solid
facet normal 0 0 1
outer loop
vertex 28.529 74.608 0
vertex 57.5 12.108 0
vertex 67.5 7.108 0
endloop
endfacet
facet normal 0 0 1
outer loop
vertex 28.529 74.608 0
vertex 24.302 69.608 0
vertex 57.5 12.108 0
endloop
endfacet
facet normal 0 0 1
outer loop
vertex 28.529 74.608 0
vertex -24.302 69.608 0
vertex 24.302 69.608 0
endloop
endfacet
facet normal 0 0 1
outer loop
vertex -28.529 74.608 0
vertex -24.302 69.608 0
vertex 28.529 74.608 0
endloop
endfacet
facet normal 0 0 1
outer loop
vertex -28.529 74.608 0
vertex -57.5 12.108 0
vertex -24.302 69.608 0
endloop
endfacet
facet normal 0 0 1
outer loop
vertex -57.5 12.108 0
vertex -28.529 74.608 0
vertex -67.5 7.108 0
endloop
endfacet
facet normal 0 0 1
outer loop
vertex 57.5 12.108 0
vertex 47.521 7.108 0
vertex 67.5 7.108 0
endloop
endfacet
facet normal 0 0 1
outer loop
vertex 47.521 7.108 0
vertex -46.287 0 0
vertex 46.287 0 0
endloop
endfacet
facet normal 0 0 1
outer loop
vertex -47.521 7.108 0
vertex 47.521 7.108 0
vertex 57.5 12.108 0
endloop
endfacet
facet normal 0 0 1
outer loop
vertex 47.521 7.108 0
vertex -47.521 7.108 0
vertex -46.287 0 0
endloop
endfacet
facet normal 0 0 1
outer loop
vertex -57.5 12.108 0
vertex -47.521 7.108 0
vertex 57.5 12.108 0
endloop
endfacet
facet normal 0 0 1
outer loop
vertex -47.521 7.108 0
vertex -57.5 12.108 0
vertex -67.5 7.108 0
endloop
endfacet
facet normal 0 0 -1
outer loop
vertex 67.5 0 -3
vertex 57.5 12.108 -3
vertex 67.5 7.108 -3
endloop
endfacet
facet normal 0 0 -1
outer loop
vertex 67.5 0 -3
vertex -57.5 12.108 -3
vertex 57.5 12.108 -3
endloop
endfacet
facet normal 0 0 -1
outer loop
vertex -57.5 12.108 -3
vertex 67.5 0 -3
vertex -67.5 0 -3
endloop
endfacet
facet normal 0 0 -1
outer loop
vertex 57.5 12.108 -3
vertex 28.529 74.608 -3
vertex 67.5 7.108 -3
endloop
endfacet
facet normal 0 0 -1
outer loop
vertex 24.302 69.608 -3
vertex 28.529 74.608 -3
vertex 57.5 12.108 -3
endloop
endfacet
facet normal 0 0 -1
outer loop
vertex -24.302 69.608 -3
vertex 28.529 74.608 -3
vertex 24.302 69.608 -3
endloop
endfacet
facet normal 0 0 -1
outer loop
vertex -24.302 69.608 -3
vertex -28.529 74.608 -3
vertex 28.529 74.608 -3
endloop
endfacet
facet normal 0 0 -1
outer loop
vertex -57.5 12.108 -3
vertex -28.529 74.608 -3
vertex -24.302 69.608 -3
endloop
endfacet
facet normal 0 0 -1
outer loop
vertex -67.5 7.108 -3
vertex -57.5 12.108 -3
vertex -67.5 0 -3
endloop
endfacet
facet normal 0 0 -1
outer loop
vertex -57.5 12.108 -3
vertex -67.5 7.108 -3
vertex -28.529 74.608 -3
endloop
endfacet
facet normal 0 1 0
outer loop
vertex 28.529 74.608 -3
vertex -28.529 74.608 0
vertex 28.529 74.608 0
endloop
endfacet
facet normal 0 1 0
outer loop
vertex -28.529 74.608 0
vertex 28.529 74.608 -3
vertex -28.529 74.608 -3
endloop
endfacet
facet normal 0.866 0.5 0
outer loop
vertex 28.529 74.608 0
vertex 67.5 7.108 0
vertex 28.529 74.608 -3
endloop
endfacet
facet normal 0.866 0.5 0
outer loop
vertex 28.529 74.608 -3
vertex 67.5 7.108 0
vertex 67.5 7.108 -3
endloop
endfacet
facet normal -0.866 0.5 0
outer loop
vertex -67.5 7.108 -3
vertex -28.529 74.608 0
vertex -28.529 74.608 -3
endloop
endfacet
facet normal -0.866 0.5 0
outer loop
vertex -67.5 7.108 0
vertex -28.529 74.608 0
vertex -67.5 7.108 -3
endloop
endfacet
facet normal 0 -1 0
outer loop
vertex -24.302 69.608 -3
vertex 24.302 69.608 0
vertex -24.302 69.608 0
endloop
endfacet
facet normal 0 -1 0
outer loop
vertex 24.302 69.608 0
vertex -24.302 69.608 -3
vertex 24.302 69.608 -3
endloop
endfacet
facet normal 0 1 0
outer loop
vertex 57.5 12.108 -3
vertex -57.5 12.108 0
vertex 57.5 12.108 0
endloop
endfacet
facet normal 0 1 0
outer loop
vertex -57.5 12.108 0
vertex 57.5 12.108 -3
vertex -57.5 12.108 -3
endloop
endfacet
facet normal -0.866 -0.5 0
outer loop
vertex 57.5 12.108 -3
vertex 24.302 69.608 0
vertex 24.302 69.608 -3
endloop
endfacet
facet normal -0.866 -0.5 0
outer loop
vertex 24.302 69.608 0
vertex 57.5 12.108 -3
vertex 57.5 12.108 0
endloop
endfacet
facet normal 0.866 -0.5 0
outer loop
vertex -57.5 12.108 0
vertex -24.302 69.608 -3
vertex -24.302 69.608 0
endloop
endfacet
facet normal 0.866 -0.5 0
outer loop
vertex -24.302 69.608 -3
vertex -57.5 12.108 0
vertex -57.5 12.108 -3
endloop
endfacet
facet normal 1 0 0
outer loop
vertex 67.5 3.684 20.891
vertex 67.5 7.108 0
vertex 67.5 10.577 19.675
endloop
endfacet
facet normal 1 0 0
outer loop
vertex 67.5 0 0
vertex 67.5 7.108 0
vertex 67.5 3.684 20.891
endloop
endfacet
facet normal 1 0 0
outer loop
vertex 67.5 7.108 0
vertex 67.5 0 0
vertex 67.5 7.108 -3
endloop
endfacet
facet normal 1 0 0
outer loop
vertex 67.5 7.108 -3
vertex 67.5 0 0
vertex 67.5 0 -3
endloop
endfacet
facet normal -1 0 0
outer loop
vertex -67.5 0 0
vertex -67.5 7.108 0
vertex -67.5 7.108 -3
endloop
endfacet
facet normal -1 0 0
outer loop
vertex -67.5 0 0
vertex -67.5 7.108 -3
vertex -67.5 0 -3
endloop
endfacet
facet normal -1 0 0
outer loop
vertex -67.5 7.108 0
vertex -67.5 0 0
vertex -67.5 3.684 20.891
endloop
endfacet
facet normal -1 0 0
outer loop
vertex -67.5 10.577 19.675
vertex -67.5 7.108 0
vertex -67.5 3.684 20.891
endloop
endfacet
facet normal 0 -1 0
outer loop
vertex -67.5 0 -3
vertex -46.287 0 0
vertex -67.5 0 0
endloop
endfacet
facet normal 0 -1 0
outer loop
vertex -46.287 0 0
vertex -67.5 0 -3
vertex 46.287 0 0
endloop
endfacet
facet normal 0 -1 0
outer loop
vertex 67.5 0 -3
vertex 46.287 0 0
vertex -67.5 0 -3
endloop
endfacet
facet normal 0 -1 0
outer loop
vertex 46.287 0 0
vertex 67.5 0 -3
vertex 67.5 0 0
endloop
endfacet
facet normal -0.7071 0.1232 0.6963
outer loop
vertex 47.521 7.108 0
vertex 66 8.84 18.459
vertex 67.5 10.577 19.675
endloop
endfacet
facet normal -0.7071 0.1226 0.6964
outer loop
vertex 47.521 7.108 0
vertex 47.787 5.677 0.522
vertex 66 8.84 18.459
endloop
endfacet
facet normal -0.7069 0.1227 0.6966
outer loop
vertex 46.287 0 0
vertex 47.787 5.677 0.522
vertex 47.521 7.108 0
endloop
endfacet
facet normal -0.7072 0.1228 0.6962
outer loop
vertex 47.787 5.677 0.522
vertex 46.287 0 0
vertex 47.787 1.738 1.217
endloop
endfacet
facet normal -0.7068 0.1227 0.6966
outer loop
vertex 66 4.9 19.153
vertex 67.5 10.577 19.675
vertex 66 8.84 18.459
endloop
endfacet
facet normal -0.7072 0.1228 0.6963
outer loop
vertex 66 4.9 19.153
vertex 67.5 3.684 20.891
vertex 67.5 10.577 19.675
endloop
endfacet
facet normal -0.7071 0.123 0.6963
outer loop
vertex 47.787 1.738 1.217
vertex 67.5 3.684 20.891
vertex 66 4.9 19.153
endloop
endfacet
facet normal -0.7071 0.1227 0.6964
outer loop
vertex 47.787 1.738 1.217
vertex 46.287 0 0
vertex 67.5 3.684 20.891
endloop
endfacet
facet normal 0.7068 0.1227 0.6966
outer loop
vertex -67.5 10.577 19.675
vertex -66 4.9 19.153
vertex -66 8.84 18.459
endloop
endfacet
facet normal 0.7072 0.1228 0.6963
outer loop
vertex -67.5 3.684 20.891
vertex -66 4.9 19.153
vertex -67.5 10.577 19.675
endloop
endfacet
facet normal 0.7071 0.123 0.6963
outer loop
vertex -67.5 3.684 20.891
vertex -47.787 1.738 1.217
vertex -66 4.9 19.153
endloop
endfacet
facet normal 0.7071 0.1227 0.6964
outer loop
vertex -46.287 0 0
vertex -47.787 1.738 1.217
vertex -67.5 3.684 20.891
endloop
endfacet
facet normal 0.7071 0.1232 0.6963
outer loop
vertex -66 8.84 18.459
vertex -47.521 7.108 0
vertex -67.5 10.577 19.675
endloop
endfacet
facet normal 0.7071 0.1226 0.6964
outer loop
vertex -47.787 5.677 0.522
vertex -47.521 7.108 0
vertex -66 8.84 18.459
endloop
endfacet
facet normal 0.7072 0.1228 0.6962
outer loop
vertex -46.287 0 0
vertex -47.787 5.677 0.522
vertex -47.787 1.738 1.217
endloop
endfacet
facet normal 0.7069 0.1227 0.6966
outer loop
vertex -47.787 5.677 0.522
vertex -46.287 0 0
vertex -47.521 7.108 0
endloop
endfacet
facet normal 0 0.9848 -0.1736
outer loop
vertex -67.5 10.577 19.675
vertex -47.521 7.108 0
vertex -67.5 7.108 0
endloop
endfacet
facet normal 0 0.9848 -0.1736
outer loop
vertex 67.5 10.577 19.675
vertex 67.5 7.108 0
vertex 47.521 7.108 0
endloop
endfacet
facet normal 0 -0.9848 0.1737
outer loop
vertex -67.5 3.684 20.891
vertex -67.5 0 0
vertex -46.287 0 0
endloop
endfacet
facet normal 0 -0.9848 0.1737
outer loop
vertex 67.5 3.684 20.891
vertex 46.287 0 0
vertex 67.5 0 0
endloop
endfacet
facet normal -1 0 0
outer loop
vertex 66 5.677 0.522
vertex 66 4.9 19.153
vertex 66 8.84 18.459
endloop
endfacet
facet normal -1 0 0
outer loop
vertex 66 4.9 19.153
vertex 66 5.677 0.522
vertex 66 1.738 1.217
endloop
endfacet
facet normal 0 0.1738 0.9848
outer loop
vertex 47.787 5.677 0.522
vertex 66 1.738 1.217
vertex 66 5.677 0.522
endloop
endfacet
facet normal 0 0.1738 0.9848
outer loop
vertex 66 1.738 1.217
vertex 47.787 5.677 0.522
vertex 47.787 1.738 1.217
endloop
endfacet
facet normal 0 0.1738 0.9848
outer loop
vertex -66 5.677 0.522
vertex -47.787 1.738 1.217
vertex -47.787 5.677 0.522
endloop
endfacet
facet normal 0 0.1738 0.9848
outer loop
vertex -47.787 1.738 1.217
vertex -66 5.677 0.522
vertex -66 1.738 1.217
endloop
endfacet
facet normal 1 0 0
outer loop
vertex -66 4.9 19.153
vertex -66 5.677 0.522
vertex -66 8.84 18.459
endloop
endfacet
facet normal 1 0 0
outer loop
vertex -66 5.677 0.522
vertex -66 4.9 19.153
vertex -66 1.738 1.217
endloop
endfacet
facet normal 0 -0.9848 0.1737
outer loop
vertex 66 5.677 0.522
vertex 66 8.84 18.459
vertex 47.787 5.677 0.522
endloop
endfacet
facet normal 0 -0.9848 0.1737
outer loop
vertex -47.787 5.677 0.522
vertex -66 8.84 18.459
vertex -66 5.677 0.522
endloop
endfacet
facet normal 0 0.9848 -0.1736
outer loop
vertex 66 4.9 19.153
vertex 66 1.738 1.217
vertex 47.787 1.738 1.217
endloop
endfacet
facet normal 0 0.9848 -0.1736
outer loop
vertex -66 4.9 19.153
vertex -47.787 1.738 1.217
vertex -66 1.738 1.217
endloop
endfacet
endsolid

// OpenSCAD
photo_width = 5*25.4;

edge = 1;
slot_thickness = 1;

old_tolerance = 1;

frame_width = photo_width + 2*edge + 2*old_tolerance;
frame_thickness = 2*edge + slot_thickness;

overlap = 15;
angle = 10;

wall_thickness = 1.5;
base_thickness = 3;
tolerance = 0.5;

stand_width = frame_width + 2*wall_thickness + 2*tolerance;
stand_thickness = frame_thickness + 2*wall_thickness + 2*tolerance;
stand_height = overlap * sqrt(2);

module stand_box() {
  cube([stand_width, stand_thickness, stand_height], center=true);
}

module corners() {
  translate([stand_width / 2, stand_height / 2, -overlap/sqrt(2)])
  rotate([0, 45, 0])
  cube(2 * overlap, center = true);

  translate([-stand_width / 2, stand_height / 2, -overlap/sqrt(2)])
  rotate([0, 45, 0])
  cube(2 * overlap, center = true);
}

module frame_box() {
  translate([0, 0, wall_thickness])
  cube([frame_width + 2*tolerance, frame_thickness + 2*tolerance, stand_height], center=true);
}

module top_section() {
  rotate([-angle, 0, 0])
  translate([0, stand_thickness/2, stand_height/2])
  difference() {
    intersection() {
      stand_box();
      corners();
    }
    frame_box();
  }
}

module trapezoid(twidth, tlength, tthick) {
  difference() {
    cube([twidth, tlength, tthick], center=true);

    translate([twidth / 2, -tlength / 2, -tthick/2 - 0.1])
    rotate([0, 0, 30])
      cube([twidth, tlength*2, tthick + 0.2]);

    translate([-twidth / 2, -tlength / 2, tthick/2 + 0.1])
    rotate([0, 180, -30])
      cube([twidth, tlength*2, tthick + 0.2]);
  }
}

cube_thick = stand_thickness/cos(angle);
module base() {
  union() {
    difference() {
      trapezoid(stand_width, stand_width/2, base_thickness);
      trapezoid(stand_width - 20, stand_width / 2 - 10, base_thickness + 0.1);
    }
    translate([0, -(stand_width/4+cube_thick/2), 0])
    cube([stand_width, cube_thick, base_thickness], center=true);
  }
}

union() {
  translate([0, stand_width/4+cube_thick, -base_thickness/2])
  base();
  top_section();
}
